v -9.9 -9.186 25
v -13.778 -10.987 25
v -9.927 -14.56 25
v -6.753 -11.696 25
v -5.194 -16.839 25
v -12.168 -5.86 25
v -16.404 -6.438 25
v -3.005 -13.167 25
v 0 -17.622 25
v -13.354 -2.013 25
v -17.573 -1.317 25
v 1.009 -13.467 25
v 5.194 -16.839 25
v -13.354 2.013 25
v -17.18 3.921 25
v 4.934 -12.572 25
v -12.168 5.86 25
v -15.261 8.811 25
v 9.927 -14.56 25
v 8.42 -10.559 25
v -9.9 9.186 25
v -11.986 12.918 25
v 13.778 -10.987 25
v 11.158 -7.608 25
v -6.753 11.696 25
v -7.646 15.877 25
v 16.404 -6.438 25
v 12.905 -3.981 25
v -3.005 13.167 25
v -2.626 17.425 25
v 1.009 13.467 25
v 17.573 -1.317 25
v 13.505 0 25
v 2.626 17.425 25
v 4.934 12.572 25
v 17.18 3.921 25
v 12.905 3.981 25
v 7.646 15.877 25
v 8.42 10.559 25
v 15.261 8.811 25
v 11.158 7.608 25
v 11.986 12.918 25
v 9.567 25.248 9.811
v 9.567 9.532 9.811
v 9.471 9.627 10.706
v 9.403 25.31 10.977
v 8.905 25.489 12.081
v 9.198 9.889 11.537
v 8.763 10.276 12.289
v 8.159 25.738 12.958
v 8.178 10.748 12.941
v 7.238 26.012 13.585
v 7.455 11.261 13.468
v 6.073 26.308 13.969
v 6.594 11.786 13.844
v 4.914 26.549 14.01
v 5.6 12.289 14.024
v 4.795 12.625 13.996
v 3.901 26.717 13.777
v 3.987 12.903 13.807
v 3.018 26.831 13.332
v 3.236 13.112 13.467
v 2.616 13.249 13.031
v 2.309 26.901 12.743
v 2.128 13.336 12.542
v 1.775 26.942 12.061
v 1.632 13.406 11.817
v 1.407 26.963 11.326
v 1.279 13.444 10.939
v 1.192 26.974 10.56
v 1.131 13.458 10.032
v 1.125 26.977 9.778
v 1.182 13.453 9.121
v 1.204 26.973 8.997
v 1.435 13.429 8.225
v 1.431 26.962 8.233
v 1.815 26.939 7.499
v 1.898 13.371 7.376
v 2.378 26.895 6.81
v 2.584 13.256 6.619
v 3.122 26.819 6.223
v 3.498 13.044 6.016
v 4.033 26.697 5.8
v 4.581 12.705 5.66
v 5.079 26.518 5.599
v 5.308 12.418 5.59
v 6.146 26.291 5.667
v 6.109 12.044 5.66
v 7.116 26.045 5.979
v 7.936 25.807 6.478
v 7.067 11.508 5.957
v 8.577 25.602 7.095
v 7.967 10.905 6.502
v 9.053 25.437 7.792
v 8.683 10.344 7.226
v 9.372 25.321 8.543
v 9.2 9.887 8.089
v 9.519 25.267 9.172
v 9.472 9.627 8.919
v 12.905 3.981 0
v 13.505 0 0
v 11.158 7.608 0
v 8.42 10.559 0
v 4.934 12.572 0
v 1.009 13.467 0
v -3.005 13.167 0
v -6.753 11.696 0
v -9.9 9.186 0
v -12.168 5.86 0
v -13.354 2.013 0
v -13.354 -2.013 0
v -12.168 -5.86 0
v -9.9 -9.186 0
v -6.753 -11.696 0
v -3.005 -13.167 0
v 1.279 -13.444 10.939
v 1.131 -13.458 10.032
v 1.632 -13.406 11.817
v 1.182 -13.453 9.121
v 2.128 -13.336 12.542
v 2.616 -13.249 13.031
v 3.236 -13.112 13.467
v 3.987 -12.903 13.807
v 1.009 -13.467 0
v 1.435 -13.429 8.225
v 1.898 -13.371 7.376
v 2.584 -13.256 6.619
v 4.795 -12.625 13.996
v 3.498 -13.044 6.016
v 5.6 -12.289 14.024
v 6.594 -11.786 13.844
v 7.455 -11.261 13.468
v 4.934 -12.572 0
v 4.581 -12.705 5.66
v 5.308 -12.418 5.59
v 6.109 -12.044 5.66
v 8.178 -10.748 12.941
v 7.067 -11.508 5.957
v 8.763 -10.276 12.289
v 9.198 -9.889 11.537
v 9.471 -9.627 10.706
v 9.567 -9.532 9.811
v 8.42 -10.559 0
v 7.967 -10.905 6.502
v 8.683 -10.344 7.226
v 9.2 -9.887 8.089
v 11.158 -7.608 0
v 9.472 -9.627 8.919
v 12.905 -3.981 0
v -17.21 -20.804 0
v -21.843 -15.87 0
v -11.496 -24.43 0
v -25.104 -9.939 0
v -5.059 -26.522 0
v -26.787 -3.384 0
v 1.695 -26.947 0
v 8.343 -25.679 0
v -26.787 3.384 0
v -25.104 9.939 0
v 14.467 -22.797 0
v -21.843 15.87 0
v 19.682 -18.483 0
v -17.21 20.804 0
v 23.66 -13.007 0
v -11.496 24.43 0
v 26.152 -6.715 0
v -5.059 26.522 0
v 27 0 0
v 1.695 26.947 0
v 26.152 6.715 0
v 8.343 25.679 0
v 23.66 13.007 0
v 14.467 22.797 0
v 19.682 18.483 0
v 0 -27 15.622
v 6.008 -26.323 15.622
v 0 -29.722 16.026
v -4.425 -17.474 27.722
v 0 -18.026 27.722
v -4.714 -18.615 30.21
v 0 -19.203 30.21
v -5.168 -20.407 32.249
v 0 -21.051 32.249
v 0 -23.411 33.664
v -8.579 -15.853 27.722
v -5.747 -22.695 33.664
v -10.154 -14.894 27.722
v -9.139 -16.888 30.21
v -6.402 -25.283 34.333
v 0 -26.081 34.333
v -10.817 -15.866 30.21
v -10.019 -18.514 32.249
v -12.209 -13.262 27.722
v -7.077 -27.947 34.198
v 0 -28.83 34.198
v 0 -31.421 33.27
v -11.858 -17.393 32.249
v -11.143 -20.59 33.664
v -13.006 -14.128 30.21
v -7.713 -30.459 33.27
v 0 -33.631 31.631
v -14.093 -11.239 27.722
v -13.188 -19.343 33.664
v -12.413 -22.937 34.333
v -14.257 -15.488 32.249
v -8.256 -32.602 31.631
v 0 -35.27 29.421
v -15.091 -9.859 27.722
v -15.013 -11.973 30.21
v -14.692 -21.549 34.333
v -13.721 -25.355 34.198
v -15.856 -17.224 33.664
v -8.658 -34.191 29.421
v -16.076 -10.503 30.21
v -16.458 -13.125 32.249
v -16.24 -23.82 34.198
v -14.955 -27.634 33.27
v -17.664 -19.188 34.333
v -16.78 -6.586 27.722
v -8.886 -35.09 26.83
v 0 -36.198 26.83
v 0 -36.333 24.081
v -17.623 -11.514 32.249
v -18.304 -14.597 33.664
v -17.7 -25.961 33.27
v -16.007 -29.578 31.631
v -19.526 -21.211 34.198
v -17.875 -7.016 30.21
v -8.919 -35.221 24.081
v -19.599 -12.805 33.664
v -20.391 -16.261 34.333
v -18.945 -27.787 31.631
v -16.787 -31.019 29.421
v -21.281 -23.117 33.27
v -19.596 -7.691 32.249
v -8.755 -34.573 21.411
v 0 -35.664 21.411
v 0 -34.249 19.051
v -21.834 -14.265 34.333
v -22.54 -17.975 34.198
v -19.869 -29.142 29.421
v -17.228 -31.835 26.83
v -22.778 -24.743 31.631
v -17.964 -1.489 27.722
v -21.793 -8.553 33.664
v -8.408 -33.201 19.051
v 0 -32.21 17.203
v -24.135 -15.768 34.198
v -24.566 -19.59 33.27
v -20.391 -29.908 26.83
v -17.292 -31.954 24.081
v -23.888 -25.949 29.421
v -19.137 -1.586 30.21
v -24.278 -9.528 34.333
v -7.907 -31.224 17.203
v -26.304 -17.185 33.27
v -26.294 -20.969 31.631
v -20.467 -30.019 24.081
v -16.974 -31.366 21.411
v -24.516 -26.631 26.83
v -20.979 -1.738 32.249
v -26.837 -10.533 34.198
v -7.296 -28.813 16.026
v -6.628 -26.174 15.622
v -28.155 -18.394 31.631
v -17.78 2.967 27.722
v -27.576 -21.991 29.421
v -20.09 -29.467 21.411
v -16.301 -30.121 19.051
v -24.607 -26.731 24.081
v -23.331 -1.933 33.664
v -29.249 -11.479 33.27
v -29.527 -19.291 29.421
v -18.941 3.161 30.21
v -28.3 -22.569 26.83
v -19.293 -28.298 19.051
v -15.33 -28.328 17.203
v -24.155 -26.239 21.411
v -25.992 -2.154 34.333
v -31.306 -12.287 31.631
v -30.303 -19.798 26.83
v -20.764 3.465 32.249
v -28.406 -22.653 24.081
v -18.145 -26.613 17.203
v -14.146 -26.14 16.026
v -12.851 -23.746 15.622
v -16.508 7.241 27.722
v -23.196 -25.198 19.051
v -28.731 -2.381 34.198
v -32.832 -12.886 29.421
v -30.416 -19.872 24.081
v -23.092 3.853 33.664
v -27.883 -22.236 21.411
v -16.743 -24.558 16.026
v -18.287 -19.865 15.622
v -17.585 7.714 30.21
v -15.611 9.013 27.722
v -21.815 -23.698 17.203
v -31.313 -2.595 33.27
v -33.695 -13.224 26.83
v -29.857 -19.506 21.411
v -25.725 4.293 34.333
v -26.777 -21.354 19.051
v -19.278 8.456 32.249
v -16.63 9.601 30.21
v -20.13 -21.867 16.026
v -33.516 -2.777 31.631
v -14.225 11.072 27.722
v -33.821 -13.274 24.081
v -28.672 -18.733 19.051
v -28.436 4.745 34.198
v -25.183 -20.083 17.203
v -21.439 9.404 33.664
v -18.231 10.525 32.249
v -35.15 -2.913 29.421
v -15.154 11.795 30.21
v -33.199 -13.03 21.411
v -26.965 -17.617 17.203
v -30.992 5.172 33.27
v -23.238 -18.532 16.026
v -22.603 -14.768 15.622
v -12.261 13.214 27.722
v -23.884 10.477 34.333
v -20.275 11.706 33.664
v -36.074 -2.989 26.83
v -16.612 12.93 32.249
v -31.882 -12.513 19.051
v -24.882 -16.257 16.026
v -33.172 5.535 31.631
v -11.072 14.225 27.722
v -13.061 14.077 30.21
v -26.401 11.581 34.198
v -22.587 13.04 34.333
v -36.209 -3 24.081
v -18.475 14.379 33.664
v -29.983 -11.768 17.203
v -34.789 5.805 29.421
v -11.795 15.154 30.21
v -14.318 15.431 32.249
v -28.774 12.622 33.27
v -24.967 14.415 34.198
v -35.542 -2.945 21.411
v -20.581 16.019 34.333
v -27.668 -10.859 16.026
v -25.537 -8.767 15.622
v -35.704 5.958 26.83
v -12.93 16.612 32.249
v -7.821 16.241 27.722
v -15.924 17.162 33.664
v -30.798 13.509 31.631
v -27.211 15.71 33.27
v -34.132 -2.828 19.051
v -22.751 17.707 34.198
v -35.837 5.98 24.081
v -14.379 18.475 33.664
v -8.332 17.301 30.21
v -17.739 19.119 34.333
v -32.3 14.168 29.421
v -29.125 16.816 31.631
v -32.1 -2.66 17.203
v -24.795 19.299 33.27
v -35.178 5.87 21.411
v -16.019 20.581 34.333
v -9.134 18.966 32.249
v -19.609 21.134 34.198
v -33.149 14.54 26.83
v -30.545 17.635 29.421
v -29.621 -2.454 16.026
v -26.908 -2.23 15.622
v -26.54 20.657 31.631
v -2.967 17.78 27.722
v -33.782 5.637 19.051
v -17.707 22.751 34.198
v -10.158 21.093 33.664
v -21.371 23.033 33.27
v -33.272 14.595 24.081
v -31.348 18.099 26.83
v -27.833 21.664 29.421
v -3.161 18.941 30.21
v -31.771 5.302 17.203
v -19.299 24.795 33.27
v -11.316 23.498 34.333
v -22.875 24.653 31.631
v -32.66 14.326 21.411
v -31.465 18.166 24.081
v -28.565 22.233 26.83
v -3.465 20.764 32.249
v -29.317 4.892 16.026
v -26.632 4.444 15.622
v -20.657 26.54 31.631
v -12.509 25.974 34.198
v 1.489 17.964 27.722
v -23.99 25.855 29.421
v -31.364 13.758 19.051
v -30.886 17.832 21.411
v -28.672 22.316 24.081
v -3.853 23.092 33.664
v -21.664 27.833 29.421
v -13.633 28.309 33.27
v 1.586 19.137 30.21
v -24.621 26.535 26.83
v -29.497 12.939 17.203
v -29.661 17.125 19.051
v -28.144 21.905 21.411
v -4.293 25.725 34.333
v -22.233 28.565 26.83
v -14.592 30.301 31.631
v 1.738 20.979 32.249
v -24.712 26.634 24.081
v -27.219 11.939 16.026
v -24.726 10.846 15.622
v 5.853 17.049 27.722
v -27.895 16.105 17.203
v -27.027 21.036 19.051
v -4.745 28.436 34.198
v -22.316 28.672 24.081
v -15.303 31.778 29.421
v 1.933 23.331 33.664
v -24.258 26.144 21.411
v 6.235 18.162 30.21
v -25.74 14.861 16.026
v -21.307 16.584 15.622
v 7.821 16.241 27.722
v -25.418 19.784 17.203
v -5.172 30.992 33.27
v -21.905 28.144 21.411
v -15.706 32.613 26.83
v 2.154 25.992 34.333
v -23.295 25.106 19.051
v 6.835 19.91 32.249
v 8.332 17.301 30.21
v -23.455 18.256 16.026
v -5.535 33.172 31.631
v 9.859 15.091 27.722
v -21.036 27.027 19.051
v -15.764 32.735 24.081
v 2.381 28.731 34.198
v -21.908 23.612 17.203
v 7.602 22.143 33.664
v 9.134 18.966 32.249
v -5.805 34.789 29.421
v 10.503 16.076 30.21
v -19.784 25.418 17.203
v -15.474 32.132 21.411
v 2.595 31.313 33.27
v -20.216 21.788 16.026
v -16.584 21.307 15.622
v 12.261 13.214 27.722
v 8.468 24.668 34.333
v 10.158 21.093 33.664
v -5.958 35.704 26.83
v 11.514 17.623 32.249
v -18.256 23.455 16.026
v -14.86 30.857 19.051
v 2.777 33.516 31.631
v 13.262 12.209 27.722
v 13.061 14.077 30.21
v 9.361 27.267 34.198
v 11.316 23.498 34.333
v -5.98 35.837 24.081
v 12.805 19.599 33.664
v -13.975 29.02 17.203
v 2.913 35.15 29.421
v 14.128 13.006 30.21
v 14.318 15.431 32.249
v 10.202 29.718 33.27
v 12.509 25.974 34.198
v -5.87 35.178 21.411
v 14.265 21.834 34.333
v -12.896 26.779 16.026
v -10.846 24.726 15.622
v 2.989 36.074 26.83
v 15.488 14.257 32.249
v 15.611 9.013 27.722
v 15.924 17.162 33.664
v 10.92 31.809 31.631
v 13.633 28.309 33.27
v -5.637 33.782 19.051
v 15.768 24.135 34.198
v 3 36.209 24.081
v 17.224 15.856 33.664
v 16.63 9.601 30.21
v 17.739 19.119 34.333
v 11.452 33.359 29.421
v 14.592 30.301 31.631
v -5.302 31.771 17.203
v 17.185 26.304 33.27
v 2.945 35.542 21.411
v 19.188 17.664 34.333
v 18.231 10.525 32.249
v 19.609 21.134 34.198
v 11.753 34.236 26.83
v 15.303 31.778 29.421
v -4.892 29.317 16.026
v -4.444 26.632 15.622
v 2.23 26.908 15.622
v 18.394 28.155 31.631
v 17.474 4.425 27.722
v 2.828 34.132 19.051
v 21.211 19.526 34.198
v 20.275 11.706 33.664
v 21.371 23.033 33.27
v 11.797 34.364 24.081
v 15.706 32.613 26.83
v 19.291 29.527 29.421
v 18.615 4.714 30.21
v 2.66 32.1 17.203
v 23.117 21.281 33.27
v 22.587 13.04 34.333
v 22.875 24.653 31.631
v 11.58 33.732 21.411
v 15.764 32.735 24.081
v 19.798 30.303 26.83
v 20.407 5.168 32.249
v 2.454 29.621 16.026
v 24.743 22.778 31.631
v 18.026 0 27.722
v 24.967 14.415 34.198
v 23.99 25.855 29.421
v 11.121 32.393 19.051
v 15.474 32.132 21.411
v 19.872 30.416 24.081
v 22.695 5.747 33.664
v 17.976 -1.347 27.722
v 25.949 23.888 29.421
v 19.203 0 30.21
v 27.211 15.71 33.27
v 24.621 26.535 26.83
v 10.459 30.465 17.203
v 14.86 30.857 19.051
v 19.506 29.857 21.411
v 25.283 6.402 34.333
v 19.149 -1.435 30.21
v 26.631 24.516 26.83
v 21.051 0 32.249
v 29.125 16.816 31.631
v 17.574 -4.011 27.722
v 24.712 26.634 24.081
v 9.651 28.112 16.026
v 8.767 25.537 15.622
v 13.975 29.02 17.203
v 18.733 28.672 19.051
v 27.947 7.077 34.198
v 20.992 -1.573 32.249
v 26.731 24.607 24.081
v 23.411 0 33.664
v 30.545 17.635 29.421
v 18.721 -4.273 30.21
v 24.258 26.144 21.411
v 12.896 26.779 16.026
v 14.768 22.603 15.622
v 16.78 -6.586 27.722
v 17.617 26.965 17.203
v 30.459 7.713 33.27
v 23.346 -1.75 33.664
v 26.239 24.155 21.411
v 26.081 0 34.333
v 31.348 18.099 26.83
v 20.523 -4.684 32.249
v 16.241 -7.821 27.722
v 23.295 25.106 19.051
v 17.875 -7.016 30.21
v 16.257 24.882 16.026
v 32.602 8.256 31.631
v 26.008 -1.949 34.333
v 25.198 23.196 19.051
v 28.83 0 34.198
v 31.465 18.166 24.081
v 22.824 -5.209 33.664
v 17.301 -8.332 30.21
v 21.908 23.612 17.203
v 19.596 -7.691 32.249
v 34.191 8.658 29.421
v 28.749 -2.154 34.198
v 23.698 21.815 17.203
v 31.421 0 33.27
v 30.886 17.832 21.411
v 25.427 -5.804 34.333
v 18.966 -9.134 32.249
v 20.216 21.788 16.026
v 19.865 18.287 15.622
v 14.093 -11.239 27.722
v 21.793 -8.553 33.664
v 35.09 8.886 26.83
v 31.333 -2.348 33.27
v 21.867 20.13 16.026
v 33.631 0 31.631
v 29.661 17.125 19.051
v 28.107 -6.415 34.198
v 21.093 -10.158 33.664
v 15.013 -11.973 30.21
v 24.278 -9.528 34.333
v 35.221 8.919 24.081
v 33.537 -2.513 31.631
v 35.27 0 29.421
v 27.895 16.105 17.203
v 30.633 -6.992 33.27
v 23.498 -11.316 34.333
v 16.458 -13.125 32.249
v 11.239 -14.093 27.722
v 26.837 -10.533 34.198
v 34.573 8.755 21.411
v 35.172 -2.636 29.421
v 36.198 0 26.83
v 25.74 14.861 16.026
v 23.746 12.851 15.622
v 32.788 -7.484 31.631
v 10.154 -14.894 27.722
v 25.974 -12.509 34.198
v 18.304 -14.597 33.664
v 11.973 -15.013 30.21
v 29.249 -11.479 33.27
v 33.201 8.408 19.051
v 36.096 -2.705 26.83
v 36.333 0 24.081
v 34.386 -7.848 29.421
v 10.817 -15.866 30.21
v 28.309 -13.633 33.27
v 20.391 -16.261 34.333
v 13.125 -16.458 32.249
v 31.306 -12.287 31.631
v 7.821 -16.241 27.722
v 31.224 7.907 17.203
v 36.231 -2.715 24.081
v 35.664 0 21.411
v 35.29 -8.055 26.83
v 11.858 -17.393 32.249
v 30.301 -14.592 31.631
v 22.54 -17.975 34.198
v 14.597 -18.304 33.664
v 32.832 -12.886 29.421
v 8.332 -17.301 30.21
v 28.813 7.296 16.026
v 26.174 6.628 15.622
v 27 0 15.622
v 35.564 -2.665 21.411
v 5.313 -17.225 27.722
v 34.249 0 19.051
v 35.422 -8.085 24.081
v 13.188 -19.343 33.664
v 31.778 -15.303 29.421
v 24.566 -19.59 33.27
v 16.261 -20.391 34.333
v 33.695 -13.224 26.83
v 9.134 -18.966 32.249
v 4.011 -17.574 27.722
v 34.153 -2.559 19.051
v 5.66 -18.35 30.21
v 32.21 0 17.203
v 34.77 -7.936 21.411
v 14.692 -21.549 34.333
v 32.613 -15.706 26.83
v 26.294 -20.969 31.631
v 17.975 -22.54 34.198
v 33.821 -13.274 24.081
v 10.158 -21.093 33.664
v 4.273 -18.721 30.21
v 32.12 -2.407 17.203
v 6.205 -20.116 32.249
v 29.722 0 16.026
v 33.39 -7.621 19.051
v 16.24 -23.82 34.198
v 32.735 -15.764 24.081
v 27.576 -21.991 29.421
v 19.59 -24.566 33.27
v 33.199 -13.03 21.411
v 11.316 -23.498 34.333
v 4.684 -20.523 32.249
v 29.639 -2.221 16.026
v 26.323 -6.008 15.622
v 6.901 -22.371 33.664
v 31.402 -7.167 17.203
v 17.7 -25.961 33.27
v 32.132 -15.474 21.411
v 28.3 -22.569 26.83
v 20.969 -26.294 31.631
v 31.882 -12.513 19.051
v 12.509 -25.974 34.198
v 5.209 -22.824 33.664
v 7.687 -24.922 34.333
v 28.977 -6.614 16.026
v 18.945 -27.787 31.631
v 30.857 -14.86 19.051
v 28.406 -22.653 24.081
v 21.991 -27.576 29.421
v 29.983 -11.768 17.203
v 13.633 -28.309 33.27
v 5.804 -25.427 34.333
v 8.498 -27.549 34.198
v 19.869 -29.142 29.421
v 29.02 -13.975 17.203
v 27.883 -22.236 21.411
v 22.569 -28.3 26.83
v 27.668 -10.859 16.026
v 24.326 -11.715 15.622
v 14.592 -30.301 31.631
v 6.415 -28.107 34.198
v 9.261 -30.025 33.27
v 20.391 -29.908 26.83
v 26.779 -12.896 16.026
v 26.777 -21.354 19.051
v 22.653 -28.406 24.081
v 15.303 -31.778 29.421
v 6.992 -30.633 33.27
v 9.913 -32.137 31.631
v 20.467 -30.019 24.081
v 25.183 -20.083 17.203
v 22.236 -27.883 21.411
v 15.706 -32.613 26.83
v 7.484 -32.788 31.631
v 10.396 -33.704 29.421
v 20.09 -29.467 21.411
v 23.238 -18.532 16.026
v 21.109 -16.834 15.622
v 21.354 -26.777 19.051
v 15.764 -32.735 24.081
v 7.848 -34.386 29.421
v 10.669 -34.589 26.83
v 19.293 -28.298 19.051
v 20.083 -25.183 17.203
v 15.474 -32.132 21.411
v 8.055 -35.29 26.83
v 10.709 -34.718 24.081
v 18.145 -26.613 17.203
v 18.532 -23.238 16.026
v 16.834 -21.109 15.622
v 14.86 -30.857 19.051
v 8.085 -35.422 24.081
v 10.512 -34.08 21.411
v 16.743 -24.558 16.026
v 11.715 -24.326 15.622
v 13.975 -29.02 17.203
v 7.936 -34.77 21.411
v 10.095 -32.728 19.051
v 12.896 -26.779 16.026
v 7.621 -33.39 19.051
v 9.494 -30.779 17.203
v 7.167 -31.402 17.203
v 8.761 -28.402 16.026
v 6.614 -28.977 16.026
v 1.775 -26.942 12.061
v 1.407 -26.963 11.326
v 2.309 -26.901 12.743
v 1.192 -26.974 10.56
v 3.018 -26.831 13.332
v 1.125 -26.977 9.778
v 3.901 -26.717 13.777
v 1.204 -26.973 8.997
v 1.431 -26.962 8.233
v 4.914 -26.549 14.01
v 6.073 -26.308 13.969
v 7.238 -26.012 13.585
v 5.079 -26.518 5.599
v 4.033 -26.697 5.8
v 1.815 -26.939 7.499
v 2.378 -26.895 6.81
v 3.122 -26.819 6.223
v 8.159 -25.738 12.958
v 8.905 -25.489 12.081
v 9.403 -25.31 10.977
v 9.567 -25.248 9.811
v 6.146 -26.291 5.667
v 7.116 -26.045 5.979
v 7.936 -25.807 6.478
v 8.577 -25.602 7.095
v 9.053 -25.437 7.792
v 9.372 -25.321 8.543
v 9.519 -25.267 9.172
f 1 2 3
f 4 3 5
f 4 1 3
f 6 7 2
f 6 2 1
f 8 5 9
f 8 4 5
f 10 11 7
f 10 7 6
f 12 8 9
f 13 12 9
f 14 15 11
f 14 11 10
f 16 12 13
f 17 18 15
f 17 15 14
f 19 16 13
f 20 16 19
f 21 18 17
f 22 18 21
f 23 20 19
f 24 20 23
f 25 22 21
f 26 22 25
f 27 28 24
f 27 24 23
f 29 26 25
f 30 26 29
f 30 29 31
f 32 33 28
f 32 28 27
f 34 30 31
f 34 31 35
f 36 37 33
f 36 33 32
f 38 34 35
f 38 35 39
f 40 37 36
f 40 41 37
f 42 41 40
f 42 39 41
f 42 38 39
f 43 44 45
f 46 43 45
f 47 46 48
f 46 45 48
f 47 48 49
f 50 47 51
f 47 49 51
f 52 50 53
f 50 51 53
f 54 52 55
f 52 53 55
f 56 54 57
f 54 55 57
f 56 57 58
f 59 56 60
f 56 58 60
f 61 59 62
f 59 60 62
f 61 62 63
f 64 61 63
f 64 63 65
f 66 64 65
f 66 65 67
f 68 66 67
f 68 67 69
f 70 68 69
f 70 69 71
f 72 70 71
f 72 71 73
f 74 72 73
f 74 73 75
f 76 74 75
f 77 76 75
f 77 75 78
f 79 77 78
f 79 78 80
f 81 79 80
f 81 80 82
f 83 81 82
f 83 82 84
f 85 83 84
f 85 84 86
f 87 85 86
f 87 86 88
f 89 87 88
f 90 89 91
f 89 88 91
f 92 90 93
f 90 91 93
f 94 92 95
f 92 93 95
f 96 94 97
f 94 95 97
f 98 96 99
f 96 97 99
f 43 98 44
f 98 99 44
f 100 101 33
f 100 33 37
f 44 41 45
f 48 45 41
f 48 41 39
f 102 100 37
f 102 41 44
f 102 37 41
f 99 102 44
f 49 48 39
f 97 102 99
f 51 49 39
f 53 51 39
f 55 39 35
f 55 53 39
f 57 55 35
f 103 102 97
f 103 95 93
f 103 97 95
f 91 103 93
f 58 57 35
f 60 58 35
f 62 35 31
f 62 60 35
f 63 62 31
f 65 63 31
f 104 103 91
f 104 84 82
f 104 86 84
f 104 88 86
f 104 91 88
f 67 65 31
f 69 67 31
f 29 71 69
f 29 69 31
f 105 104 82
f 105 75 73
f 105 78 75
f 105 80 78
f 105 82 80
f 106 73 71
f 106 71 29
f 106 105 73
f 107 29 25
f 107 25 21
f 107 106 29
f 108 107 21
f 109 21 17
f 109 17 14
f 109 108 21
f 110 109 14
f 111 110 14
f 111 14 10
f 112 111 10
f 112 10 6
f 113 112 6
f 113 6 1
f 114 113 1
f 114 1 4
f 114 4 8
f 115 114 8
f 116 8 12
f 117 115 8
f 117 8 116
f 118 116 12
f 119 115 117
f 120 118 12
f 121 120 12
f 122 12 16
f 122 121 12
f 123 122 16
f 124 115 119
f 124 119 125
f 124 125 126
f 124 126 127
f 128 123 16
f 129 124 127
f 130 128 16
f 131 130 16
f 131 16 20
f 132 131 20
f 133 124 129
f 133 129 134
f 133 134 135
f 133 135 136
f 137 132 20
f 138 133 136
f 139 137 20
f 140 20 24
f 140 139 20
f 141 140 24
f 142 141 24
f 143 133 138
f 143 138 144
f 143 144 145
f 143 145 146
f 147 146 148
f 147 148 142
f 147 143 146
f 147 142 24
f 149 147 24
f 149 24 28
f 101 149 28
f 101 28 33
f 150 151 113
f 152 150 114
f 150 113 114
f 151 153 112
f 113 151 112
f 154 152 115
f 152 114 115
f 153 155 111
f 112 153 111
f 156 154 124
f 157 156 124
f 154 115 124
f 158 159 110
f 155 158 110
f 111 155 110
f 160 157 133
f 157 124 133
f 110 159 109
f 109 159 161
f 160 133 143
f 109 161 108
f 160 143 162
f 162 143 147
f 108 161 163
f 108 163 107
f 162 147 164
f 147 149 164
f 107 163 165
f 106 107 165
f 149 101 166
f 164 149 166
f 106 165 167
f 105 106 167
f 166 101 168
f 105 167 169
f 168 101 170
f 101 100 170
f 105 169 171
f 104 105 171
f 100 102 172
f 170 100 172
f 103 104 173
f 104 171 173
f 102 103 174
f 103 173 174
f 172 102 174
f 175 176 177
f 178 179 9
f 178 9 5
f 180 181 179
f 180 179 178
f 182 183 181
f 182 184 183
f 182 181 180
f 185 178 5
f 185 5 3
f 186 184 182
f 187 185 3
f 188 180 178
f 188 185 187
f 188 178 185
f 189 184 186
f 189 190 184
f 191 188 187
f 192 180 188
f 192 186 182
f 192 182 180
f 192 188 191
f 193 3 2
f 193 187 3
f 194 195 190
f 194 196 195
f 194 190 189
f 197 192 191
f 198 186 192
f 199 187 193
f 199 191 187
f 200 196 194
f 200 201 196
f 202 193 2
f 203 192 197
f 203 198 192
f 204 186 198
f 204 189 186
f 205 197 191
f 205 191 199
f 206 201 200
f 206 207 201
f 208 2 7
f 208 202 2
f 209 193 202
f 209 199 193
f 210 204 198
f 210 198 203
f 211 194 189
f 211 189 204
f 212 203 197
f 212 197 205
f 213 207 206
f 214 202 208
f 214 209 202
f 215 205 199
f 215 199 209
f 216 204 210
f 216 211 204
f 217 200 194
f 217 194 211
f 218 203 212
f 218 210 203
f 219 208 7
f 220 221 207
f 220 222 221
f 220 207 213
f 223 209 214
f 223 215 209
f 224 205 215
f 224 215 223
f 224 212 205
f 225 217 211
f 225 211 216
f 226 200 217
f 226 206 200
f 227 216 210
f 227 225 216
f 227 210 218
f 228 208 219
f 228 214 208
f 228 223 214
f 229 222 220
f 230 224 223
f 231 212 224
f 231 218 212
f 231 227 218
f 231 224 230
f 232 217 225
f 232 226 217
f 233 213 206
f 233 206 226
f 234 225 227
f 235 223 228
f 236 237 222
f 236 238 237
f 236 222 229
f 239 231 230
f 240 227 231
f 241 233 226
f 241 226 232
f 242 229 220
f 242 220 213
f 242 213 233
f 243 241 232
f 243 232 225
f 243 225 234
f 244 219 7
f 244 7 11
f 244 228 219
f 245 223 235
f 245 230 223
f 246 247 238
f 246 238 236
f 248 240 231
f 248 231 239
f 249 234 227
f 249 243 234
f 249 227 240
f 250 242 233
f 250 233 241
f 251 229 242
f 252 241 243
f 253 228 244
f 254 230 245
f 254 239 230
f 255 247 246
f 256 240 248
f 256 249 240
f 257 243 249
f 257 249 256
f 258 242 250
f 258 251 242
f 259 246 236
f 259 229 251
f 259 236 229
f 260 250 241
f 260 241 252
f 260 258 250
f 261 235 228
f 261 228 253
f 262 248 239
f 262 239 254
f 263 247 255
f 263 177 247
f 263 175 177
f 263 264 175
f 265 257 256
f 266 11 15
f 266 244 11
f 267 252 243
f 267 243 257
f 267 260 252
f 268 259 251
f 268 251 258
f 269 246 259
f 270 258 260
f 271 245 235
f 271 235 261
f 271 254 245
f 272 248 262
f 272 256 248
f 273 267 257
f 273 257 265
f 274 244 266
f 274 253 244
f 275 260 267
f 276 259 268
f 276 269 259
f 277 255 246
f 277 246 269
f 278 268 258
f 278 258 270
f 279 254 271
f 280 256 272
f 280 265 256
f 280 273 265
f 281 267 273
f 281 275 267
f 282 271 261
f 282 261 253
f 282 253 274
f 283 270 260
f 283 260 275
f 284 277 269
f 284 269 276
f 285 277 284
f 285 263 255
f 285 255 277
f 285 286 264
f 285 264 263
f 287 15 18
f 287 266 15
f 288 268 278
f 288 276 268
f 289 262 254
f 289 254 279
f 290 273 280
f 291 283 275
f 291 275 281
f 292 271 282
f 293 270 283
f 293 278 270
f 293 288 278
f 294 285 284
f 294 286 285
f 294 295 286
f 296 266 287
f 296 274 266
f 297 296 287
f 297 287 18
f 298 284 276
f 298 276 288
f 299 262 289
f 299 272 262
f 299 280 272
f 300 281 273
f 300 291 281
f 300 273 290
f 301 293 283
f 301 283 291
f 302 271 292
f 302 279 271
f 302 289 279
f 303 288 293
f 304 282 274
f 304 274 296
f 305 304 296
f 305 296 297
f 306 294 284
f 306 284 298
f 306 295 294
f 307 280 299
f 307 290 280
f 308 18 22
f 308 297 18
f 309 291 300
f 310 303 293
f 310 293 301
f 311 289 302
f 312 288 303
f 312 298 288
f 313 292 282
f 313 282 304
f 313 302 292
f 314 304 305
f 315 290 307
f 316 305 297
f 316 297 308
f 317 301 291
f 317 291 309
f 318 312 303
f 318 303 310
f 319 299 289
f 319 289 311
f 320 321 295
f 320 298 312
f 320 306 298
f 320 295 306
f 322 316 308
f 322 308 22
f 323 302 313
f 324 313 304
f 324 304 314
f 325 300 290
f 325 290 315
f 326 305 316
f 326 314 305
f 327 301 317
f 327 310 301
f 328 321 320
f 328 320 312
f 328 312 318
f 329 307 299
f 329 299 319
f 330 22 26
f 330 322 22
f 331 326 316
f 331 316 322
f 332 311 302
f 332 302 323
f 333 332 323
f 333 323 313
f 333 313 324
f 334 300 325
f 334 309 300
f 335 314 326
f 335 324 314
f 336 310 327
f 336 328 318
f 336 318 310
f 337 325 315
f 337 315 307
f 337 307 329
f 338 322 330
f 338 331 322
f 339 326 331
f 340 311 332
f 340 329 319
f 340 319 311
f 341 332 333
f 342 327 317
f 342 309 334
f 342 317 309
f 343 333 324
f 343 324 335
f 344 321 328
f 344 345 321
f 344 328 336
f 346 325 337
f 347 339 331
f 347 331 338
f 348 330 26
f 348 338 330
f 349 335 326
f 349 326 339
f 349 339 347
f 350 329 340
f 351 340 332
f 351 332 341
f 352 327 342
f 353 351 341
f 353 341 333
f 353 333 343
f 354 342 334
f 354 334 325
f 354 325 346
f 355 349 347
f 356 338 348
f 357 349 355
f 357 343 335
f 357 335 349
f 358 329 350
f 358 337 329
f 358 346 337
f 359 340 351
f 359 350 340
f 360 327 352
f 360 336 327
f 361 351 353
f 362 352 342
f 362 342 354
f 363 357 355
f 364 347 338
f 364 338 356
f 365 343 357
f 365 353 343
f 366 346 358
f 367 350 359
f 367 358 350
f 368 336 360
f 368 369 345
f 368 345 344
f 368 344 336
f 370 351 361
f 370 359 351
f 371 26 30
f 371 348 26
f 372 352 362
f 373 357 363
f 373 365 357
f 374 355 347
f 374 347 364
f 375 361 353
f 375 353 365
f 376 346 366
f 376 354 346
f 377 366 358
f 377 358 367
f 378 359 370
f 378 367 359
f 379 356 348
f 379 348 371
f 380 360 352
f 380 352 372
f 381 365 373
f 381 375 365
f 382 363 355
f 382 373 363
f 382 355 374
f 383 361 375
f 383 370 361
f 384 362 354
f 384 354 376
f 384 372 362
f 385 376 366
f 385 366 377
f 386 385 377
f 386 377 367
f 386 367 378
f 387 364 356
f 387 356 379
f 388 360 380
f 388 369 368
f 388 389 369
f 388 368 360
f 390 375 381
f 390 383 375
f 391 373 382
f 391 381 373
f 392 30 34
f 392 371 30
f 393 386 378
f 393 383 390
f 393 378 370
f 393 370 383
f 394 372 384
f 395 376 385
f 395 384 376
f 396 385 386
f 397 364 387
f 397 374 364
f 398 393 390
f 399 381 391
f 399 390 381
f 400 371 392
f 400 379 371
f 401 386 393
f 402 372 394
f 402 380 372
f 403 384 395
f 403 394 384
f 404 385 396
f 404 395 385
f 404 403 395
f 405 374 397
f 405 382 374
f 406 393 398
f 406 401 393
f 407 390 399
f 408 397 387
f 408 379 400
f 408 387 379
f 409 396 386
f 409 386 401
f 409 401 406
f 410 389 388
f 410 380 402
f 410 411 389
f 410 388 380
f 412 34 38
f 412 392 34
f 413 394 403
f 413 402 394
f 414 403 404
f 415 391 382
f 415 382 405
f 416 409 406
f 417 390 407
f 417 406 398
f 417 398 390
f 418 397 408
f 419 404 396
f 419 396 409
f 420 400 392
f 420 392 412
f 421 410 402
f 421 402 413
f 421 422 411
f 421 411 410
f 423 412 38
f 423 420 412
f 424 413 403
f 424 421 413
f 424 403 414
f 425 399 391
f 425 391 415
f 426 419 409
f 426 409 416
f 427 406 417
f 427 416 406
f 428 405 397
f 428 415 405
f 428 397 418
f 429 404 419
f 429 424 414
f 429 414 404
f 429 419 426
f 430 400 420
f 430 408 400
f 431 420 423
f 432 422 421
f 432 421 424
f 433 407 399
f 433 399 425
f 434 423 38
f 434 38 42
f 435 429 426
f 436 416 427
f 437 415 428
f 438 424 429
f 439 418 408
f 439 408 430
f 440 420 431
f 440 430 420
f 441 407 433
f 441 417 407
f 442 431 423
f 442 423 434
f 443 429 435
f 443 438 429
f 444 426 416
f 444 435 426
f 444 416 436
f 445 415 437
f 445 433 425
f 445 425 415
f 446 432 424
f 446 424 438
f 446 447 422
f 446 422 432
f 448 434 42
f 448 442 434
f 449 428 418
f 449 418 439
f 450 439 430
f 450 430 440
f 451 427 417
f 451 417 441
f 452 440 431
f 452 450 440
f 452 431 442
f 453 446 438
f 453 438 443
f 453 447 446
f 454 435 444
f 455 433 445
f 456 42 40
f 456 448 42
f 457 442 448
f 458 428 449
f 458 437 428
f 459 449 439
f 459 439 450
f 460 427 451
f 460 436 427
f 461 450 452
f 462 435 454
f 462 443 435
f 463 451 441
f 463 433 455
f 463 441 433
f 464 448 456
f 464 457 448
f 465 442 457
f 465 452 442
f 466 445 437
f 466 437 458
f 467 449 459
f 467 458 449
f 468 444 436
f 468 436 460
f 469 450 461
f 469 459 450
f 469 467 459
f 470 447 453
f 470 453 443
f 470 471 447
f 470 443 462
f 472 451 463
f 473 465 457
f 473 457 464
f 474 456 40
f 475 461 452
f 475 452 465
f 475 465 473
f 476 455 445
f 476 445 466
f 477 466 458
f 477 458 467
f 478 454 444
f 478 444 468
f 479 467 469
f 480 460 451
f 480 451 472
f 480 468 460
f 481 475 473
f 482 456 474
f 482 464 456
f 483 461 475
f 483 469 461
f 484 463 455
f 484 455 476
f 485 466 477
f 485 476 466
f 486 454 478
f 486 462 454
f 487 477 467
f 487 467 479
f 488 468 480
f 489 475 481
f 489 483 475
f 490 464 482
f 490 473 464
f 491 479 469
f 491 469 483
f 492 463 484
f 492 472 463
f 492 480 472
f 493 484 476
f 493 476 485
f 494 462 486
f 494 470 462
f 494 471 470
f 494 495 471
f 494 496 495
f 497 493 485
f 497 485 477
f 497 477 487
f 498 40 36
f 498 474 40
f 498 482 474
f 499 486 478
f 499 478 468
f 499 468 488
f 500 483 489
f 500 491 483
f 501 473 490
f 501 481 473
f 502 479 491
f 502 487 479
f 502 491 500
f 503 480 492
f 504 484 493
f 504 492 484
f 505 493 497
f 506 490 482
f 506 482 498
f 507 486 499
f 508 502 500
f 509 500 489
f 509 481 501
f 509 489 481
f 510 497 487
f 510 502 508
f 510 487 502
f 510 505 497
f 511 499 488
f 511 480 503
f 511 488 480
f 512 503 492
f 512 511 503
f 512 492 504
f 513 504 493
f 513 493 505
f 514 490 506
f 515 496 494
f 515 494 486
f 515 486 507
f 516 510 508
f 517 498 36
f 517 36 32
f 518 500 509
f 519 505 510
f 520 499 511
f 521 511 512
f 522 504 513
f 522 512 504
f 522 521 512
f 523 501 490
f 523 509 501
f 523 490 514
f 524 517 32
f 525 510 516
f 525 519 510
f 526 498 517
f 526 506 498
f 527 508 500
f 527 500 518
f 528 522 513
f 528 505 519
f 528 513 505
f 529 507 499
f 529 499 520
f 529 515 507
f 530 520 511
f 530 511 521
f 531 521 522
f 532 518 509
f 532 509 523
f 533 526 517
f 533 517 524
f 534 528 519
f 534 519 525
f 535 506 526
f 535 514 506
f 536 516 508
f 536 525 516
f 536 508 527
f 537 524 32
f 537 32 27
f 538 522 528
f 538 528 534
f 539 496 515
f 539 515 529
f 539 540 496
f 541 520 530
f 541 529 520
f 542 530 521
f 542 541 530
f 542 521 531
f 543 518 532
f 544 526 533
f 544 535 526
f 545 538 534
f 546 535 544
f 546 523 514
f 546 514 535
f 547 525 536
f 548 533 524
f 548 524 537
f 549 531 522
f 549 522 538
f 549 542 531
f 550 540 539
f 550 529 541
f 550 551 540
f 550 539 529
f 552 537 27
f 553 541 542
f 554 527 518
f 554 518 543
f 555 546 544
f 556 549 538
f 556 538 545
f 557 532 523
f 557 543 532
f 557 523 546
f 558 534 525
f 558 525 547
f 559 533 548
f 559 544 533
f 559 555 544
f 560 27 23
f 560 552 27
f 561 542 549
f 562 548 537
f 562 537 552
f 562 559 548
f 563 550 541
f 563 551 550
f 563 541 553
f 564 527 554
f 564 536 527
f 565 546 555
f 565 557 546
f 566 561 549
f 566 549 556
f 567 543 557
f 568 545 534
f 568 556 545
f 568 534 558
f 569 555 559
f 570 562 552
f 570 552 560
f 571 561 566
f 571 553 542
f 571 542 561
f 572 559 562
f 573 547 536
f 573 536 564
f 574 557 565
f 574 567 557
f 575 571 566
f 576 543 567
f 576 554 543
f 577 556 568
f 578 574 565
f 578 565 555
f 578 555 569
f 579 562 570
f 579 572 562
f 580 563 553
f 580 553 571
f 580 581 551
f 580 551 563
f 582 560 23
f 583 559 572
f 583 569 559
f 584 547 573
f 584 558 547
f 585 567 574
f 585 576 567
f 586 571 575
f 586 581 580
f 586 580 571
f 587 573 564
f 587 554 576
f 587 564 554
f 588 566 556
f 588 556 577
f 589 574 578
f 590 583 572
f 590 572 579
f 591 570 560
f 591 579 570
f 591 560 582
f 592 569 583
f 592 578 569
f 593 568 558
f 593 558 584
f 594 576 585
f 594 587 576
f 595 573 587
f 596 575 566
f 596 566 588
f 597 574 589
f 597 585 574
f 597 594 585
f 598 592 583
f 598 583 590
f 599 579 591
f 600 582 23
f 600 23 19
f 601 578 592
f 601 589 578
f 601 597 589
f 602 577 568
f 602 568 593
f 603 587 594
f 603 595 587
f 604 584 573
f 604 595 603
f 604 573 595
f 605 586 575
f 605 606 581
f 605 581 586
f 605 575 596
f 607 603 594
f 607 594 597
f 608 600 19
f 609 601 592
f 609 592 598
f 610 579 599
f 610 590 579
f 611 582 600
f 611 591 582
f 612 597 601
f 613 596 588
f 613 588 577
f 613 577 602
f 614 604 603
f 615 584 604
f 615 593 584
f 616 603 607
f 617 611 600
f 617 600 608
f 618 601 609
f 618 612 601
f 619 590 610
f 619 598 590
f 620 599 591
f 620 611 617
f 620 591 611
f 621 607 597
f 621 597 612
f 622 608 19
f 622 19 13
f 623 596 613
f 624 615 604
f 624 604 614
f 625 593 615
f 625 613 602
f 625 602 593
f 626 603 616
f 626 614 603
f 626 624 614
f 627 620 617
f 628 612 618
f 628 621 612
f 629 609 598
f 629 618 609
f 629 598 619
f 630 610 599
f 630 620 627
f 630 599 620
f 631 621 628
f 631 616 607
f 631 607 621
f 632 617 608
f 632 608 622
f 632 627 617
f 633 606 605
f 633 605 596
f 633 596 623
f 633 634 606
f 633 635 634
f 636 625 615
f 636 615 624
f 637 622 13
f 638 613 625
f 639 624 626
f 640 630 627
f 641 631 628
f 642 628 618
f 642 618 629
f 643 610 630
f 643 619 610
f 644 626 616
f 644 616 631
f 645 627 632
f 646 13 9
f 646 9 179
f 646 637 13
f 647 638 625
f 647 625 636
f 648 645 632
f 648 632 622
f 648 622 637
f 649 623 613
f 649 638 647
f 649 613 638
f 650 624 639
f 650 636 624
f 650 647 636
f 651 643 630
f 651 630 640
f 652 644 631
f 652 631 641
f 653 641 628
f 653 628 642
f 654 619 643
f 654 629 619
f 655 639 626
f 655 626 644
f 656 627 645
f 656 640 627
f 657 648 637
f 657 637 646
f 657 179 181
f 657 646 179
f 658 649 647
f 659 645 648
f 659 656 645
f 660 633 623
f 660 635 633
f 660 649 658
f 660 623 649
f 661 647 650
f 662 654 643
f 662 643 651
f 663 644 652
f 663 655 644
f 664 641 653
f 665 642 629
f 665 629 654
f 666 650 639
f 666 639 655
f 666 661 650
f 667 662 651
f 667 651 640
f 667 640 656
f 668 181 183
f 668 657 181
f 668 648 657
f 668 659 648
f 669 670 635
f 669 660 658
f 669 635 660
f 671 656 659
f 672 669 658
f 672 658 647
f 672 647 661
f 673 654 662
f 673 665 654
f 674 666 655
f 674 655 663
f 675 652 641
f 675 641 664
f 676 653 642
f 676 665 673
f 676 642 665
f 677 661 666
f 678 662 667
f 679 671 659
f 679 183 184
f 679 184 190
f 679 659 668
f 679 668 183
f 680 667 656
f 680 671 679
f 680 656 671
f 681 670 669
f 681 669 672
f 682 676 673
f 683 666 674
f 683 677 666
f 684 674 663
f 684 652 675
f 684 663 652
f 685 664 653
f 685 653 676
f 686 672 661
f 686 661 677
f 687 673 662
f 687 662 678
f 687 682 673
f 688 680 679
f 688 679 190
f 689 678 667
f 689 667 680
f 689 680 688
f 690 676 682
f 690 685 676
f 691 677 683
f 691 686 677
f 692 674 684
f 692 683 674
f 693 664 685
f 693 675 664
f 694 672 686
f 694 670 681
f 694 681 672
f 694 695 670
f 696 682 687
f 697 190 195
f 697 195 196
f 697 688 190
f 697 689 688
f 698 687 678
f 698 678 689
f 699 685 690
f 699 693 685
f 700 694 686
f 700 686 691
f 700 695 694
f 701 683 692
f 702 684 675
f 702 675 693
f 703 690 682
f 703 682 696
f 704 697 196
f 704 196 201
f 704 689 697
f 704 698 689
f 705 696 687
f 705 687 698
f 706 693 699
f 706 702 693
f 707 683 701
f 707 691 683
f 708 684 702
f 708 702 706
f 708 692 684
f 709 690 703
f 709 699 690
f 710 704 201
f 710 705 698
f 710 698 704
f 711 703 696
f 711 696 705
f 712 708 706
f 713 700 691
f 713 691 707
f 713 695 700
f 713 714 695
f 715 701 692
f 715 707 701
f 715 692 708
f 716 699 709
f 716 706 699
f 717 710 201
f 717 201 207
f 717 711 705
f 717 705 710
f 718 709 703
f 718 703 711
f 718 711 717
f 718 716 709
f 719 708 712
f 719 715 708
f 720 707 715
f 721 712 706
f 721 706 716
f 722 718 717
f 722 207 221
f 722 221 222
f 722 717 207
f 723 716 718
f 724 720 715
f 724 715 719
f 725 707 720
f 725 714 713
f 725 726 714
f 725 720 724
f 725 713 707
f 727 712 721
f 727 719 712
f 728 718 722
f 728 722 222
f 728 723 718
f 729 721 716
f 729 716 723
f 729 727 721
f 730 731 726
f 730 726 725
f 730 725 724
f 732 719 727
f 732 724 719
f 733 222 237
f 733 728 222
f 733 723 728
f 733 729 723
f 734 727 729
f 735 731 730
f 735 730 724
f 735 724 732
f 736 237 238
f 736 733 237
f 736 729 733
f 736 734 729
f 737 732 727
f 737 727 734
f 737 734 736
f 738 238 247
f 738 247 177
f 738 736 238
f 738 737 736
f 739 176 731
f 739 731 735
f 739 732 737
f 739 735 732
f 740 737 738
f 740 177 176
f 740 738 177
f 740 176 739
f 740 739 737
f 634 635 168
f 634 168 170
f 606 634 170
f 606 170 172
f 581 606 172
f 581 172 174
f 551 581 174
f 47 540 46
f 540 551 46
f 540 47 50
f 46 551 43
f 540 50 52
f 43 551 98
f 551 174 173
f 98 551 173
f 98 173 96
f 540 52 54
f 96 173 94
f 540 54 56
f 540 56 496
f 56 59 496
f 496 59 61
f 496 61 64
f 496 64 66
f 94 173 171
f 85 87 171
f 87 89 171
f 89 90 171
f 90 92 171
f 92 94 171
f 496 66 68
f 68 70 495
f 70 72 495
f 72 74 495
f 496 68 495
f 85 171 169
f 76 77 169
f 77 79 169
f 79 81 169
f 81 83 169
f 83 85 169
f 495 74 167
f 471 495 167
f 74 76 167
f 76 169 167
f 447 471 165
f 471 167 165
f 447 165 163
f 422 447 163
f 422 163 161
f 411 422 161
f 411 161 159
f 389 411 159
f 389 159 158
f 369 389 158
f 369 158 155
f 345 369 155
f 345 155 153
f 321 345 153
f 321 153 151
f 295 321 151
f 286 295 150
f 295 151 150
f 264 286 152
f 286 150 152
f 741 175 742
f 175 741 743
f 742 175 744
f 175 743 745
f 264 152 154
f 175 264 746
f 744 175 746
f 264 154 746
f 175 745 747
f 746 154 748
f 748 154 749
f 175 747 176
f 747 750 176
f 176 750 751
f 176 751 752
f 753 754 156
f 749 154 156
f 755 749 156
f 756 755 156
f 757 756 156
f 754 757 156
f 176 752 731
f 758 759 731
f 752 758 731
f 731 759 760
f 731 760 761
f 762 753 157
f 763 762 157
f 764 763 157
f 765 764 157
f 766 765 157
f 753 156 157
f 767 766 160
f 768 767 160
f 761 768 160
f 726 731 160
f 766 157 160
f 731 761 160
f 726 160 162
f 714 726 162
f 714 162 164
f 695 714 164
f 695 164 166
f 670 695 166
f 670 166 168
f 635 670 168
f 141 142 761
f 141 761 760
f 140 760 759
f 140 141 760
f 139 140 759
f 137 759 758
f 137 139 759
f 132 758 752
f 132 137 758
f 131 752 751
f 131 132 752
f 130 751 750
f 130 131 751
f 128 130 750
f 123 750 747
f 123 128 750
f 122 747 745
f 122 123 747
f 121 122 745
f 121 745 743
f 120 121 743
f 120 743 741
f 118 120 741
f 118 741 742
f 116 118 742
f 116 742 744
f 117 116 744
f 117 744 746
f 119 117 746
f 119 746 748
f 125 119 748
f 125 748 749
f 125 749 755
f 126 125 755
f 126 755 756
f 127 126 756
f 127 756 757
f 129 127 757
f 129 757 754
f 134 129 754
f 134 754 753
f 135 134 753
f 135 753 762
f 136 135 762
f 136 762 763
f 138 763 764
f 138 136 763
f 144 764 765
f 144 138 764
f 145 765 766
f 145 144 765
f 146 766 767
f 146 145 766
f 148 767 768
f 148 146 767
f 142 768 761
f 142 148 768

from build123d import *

# Parameters (mm, degrees)
F0_R          = 27
F0_R_2        = 13.50515
F1_DEPTH      = 25
F2_R          = 9.377807
F4_R          = 4.220987
F5_DEPTH      = 30
F5_DEPTH_BACK = 30


with BuildPart() as f1:
    # F0 (on Top) → F1 (new body)
    with BuildSketch(Plane.XY):
        Circle(F0_R)
        Circle(F0_R_2, mode=Mode.SUBTRACT)
    extrude(amount=F1_DEPTH)

    # F2 (on Right) → F3 (revolve)
    with BuildSketch(Plane.YZ):
        with Locations((-27, 25)):
            Circle(F2_R)
    revolve(axis=Axis((0, 0, 0), (0, 0, -1)))

    # F4 (on Front) → F5 (cut, two sides)
    with BuildSketch(Plane.XZ) as f5_sk:
        with Locations((5.346159, 9.811127)):
            Circle(F4_R)
    extrude(amount=F5_DEPTH, mode=Mode.SUBTRACT)
    extrude(f5_sk.sketch, amount=-F5_DEPTH_BACK, mode=Mode.SUBTRACT)


solid = f1.part
